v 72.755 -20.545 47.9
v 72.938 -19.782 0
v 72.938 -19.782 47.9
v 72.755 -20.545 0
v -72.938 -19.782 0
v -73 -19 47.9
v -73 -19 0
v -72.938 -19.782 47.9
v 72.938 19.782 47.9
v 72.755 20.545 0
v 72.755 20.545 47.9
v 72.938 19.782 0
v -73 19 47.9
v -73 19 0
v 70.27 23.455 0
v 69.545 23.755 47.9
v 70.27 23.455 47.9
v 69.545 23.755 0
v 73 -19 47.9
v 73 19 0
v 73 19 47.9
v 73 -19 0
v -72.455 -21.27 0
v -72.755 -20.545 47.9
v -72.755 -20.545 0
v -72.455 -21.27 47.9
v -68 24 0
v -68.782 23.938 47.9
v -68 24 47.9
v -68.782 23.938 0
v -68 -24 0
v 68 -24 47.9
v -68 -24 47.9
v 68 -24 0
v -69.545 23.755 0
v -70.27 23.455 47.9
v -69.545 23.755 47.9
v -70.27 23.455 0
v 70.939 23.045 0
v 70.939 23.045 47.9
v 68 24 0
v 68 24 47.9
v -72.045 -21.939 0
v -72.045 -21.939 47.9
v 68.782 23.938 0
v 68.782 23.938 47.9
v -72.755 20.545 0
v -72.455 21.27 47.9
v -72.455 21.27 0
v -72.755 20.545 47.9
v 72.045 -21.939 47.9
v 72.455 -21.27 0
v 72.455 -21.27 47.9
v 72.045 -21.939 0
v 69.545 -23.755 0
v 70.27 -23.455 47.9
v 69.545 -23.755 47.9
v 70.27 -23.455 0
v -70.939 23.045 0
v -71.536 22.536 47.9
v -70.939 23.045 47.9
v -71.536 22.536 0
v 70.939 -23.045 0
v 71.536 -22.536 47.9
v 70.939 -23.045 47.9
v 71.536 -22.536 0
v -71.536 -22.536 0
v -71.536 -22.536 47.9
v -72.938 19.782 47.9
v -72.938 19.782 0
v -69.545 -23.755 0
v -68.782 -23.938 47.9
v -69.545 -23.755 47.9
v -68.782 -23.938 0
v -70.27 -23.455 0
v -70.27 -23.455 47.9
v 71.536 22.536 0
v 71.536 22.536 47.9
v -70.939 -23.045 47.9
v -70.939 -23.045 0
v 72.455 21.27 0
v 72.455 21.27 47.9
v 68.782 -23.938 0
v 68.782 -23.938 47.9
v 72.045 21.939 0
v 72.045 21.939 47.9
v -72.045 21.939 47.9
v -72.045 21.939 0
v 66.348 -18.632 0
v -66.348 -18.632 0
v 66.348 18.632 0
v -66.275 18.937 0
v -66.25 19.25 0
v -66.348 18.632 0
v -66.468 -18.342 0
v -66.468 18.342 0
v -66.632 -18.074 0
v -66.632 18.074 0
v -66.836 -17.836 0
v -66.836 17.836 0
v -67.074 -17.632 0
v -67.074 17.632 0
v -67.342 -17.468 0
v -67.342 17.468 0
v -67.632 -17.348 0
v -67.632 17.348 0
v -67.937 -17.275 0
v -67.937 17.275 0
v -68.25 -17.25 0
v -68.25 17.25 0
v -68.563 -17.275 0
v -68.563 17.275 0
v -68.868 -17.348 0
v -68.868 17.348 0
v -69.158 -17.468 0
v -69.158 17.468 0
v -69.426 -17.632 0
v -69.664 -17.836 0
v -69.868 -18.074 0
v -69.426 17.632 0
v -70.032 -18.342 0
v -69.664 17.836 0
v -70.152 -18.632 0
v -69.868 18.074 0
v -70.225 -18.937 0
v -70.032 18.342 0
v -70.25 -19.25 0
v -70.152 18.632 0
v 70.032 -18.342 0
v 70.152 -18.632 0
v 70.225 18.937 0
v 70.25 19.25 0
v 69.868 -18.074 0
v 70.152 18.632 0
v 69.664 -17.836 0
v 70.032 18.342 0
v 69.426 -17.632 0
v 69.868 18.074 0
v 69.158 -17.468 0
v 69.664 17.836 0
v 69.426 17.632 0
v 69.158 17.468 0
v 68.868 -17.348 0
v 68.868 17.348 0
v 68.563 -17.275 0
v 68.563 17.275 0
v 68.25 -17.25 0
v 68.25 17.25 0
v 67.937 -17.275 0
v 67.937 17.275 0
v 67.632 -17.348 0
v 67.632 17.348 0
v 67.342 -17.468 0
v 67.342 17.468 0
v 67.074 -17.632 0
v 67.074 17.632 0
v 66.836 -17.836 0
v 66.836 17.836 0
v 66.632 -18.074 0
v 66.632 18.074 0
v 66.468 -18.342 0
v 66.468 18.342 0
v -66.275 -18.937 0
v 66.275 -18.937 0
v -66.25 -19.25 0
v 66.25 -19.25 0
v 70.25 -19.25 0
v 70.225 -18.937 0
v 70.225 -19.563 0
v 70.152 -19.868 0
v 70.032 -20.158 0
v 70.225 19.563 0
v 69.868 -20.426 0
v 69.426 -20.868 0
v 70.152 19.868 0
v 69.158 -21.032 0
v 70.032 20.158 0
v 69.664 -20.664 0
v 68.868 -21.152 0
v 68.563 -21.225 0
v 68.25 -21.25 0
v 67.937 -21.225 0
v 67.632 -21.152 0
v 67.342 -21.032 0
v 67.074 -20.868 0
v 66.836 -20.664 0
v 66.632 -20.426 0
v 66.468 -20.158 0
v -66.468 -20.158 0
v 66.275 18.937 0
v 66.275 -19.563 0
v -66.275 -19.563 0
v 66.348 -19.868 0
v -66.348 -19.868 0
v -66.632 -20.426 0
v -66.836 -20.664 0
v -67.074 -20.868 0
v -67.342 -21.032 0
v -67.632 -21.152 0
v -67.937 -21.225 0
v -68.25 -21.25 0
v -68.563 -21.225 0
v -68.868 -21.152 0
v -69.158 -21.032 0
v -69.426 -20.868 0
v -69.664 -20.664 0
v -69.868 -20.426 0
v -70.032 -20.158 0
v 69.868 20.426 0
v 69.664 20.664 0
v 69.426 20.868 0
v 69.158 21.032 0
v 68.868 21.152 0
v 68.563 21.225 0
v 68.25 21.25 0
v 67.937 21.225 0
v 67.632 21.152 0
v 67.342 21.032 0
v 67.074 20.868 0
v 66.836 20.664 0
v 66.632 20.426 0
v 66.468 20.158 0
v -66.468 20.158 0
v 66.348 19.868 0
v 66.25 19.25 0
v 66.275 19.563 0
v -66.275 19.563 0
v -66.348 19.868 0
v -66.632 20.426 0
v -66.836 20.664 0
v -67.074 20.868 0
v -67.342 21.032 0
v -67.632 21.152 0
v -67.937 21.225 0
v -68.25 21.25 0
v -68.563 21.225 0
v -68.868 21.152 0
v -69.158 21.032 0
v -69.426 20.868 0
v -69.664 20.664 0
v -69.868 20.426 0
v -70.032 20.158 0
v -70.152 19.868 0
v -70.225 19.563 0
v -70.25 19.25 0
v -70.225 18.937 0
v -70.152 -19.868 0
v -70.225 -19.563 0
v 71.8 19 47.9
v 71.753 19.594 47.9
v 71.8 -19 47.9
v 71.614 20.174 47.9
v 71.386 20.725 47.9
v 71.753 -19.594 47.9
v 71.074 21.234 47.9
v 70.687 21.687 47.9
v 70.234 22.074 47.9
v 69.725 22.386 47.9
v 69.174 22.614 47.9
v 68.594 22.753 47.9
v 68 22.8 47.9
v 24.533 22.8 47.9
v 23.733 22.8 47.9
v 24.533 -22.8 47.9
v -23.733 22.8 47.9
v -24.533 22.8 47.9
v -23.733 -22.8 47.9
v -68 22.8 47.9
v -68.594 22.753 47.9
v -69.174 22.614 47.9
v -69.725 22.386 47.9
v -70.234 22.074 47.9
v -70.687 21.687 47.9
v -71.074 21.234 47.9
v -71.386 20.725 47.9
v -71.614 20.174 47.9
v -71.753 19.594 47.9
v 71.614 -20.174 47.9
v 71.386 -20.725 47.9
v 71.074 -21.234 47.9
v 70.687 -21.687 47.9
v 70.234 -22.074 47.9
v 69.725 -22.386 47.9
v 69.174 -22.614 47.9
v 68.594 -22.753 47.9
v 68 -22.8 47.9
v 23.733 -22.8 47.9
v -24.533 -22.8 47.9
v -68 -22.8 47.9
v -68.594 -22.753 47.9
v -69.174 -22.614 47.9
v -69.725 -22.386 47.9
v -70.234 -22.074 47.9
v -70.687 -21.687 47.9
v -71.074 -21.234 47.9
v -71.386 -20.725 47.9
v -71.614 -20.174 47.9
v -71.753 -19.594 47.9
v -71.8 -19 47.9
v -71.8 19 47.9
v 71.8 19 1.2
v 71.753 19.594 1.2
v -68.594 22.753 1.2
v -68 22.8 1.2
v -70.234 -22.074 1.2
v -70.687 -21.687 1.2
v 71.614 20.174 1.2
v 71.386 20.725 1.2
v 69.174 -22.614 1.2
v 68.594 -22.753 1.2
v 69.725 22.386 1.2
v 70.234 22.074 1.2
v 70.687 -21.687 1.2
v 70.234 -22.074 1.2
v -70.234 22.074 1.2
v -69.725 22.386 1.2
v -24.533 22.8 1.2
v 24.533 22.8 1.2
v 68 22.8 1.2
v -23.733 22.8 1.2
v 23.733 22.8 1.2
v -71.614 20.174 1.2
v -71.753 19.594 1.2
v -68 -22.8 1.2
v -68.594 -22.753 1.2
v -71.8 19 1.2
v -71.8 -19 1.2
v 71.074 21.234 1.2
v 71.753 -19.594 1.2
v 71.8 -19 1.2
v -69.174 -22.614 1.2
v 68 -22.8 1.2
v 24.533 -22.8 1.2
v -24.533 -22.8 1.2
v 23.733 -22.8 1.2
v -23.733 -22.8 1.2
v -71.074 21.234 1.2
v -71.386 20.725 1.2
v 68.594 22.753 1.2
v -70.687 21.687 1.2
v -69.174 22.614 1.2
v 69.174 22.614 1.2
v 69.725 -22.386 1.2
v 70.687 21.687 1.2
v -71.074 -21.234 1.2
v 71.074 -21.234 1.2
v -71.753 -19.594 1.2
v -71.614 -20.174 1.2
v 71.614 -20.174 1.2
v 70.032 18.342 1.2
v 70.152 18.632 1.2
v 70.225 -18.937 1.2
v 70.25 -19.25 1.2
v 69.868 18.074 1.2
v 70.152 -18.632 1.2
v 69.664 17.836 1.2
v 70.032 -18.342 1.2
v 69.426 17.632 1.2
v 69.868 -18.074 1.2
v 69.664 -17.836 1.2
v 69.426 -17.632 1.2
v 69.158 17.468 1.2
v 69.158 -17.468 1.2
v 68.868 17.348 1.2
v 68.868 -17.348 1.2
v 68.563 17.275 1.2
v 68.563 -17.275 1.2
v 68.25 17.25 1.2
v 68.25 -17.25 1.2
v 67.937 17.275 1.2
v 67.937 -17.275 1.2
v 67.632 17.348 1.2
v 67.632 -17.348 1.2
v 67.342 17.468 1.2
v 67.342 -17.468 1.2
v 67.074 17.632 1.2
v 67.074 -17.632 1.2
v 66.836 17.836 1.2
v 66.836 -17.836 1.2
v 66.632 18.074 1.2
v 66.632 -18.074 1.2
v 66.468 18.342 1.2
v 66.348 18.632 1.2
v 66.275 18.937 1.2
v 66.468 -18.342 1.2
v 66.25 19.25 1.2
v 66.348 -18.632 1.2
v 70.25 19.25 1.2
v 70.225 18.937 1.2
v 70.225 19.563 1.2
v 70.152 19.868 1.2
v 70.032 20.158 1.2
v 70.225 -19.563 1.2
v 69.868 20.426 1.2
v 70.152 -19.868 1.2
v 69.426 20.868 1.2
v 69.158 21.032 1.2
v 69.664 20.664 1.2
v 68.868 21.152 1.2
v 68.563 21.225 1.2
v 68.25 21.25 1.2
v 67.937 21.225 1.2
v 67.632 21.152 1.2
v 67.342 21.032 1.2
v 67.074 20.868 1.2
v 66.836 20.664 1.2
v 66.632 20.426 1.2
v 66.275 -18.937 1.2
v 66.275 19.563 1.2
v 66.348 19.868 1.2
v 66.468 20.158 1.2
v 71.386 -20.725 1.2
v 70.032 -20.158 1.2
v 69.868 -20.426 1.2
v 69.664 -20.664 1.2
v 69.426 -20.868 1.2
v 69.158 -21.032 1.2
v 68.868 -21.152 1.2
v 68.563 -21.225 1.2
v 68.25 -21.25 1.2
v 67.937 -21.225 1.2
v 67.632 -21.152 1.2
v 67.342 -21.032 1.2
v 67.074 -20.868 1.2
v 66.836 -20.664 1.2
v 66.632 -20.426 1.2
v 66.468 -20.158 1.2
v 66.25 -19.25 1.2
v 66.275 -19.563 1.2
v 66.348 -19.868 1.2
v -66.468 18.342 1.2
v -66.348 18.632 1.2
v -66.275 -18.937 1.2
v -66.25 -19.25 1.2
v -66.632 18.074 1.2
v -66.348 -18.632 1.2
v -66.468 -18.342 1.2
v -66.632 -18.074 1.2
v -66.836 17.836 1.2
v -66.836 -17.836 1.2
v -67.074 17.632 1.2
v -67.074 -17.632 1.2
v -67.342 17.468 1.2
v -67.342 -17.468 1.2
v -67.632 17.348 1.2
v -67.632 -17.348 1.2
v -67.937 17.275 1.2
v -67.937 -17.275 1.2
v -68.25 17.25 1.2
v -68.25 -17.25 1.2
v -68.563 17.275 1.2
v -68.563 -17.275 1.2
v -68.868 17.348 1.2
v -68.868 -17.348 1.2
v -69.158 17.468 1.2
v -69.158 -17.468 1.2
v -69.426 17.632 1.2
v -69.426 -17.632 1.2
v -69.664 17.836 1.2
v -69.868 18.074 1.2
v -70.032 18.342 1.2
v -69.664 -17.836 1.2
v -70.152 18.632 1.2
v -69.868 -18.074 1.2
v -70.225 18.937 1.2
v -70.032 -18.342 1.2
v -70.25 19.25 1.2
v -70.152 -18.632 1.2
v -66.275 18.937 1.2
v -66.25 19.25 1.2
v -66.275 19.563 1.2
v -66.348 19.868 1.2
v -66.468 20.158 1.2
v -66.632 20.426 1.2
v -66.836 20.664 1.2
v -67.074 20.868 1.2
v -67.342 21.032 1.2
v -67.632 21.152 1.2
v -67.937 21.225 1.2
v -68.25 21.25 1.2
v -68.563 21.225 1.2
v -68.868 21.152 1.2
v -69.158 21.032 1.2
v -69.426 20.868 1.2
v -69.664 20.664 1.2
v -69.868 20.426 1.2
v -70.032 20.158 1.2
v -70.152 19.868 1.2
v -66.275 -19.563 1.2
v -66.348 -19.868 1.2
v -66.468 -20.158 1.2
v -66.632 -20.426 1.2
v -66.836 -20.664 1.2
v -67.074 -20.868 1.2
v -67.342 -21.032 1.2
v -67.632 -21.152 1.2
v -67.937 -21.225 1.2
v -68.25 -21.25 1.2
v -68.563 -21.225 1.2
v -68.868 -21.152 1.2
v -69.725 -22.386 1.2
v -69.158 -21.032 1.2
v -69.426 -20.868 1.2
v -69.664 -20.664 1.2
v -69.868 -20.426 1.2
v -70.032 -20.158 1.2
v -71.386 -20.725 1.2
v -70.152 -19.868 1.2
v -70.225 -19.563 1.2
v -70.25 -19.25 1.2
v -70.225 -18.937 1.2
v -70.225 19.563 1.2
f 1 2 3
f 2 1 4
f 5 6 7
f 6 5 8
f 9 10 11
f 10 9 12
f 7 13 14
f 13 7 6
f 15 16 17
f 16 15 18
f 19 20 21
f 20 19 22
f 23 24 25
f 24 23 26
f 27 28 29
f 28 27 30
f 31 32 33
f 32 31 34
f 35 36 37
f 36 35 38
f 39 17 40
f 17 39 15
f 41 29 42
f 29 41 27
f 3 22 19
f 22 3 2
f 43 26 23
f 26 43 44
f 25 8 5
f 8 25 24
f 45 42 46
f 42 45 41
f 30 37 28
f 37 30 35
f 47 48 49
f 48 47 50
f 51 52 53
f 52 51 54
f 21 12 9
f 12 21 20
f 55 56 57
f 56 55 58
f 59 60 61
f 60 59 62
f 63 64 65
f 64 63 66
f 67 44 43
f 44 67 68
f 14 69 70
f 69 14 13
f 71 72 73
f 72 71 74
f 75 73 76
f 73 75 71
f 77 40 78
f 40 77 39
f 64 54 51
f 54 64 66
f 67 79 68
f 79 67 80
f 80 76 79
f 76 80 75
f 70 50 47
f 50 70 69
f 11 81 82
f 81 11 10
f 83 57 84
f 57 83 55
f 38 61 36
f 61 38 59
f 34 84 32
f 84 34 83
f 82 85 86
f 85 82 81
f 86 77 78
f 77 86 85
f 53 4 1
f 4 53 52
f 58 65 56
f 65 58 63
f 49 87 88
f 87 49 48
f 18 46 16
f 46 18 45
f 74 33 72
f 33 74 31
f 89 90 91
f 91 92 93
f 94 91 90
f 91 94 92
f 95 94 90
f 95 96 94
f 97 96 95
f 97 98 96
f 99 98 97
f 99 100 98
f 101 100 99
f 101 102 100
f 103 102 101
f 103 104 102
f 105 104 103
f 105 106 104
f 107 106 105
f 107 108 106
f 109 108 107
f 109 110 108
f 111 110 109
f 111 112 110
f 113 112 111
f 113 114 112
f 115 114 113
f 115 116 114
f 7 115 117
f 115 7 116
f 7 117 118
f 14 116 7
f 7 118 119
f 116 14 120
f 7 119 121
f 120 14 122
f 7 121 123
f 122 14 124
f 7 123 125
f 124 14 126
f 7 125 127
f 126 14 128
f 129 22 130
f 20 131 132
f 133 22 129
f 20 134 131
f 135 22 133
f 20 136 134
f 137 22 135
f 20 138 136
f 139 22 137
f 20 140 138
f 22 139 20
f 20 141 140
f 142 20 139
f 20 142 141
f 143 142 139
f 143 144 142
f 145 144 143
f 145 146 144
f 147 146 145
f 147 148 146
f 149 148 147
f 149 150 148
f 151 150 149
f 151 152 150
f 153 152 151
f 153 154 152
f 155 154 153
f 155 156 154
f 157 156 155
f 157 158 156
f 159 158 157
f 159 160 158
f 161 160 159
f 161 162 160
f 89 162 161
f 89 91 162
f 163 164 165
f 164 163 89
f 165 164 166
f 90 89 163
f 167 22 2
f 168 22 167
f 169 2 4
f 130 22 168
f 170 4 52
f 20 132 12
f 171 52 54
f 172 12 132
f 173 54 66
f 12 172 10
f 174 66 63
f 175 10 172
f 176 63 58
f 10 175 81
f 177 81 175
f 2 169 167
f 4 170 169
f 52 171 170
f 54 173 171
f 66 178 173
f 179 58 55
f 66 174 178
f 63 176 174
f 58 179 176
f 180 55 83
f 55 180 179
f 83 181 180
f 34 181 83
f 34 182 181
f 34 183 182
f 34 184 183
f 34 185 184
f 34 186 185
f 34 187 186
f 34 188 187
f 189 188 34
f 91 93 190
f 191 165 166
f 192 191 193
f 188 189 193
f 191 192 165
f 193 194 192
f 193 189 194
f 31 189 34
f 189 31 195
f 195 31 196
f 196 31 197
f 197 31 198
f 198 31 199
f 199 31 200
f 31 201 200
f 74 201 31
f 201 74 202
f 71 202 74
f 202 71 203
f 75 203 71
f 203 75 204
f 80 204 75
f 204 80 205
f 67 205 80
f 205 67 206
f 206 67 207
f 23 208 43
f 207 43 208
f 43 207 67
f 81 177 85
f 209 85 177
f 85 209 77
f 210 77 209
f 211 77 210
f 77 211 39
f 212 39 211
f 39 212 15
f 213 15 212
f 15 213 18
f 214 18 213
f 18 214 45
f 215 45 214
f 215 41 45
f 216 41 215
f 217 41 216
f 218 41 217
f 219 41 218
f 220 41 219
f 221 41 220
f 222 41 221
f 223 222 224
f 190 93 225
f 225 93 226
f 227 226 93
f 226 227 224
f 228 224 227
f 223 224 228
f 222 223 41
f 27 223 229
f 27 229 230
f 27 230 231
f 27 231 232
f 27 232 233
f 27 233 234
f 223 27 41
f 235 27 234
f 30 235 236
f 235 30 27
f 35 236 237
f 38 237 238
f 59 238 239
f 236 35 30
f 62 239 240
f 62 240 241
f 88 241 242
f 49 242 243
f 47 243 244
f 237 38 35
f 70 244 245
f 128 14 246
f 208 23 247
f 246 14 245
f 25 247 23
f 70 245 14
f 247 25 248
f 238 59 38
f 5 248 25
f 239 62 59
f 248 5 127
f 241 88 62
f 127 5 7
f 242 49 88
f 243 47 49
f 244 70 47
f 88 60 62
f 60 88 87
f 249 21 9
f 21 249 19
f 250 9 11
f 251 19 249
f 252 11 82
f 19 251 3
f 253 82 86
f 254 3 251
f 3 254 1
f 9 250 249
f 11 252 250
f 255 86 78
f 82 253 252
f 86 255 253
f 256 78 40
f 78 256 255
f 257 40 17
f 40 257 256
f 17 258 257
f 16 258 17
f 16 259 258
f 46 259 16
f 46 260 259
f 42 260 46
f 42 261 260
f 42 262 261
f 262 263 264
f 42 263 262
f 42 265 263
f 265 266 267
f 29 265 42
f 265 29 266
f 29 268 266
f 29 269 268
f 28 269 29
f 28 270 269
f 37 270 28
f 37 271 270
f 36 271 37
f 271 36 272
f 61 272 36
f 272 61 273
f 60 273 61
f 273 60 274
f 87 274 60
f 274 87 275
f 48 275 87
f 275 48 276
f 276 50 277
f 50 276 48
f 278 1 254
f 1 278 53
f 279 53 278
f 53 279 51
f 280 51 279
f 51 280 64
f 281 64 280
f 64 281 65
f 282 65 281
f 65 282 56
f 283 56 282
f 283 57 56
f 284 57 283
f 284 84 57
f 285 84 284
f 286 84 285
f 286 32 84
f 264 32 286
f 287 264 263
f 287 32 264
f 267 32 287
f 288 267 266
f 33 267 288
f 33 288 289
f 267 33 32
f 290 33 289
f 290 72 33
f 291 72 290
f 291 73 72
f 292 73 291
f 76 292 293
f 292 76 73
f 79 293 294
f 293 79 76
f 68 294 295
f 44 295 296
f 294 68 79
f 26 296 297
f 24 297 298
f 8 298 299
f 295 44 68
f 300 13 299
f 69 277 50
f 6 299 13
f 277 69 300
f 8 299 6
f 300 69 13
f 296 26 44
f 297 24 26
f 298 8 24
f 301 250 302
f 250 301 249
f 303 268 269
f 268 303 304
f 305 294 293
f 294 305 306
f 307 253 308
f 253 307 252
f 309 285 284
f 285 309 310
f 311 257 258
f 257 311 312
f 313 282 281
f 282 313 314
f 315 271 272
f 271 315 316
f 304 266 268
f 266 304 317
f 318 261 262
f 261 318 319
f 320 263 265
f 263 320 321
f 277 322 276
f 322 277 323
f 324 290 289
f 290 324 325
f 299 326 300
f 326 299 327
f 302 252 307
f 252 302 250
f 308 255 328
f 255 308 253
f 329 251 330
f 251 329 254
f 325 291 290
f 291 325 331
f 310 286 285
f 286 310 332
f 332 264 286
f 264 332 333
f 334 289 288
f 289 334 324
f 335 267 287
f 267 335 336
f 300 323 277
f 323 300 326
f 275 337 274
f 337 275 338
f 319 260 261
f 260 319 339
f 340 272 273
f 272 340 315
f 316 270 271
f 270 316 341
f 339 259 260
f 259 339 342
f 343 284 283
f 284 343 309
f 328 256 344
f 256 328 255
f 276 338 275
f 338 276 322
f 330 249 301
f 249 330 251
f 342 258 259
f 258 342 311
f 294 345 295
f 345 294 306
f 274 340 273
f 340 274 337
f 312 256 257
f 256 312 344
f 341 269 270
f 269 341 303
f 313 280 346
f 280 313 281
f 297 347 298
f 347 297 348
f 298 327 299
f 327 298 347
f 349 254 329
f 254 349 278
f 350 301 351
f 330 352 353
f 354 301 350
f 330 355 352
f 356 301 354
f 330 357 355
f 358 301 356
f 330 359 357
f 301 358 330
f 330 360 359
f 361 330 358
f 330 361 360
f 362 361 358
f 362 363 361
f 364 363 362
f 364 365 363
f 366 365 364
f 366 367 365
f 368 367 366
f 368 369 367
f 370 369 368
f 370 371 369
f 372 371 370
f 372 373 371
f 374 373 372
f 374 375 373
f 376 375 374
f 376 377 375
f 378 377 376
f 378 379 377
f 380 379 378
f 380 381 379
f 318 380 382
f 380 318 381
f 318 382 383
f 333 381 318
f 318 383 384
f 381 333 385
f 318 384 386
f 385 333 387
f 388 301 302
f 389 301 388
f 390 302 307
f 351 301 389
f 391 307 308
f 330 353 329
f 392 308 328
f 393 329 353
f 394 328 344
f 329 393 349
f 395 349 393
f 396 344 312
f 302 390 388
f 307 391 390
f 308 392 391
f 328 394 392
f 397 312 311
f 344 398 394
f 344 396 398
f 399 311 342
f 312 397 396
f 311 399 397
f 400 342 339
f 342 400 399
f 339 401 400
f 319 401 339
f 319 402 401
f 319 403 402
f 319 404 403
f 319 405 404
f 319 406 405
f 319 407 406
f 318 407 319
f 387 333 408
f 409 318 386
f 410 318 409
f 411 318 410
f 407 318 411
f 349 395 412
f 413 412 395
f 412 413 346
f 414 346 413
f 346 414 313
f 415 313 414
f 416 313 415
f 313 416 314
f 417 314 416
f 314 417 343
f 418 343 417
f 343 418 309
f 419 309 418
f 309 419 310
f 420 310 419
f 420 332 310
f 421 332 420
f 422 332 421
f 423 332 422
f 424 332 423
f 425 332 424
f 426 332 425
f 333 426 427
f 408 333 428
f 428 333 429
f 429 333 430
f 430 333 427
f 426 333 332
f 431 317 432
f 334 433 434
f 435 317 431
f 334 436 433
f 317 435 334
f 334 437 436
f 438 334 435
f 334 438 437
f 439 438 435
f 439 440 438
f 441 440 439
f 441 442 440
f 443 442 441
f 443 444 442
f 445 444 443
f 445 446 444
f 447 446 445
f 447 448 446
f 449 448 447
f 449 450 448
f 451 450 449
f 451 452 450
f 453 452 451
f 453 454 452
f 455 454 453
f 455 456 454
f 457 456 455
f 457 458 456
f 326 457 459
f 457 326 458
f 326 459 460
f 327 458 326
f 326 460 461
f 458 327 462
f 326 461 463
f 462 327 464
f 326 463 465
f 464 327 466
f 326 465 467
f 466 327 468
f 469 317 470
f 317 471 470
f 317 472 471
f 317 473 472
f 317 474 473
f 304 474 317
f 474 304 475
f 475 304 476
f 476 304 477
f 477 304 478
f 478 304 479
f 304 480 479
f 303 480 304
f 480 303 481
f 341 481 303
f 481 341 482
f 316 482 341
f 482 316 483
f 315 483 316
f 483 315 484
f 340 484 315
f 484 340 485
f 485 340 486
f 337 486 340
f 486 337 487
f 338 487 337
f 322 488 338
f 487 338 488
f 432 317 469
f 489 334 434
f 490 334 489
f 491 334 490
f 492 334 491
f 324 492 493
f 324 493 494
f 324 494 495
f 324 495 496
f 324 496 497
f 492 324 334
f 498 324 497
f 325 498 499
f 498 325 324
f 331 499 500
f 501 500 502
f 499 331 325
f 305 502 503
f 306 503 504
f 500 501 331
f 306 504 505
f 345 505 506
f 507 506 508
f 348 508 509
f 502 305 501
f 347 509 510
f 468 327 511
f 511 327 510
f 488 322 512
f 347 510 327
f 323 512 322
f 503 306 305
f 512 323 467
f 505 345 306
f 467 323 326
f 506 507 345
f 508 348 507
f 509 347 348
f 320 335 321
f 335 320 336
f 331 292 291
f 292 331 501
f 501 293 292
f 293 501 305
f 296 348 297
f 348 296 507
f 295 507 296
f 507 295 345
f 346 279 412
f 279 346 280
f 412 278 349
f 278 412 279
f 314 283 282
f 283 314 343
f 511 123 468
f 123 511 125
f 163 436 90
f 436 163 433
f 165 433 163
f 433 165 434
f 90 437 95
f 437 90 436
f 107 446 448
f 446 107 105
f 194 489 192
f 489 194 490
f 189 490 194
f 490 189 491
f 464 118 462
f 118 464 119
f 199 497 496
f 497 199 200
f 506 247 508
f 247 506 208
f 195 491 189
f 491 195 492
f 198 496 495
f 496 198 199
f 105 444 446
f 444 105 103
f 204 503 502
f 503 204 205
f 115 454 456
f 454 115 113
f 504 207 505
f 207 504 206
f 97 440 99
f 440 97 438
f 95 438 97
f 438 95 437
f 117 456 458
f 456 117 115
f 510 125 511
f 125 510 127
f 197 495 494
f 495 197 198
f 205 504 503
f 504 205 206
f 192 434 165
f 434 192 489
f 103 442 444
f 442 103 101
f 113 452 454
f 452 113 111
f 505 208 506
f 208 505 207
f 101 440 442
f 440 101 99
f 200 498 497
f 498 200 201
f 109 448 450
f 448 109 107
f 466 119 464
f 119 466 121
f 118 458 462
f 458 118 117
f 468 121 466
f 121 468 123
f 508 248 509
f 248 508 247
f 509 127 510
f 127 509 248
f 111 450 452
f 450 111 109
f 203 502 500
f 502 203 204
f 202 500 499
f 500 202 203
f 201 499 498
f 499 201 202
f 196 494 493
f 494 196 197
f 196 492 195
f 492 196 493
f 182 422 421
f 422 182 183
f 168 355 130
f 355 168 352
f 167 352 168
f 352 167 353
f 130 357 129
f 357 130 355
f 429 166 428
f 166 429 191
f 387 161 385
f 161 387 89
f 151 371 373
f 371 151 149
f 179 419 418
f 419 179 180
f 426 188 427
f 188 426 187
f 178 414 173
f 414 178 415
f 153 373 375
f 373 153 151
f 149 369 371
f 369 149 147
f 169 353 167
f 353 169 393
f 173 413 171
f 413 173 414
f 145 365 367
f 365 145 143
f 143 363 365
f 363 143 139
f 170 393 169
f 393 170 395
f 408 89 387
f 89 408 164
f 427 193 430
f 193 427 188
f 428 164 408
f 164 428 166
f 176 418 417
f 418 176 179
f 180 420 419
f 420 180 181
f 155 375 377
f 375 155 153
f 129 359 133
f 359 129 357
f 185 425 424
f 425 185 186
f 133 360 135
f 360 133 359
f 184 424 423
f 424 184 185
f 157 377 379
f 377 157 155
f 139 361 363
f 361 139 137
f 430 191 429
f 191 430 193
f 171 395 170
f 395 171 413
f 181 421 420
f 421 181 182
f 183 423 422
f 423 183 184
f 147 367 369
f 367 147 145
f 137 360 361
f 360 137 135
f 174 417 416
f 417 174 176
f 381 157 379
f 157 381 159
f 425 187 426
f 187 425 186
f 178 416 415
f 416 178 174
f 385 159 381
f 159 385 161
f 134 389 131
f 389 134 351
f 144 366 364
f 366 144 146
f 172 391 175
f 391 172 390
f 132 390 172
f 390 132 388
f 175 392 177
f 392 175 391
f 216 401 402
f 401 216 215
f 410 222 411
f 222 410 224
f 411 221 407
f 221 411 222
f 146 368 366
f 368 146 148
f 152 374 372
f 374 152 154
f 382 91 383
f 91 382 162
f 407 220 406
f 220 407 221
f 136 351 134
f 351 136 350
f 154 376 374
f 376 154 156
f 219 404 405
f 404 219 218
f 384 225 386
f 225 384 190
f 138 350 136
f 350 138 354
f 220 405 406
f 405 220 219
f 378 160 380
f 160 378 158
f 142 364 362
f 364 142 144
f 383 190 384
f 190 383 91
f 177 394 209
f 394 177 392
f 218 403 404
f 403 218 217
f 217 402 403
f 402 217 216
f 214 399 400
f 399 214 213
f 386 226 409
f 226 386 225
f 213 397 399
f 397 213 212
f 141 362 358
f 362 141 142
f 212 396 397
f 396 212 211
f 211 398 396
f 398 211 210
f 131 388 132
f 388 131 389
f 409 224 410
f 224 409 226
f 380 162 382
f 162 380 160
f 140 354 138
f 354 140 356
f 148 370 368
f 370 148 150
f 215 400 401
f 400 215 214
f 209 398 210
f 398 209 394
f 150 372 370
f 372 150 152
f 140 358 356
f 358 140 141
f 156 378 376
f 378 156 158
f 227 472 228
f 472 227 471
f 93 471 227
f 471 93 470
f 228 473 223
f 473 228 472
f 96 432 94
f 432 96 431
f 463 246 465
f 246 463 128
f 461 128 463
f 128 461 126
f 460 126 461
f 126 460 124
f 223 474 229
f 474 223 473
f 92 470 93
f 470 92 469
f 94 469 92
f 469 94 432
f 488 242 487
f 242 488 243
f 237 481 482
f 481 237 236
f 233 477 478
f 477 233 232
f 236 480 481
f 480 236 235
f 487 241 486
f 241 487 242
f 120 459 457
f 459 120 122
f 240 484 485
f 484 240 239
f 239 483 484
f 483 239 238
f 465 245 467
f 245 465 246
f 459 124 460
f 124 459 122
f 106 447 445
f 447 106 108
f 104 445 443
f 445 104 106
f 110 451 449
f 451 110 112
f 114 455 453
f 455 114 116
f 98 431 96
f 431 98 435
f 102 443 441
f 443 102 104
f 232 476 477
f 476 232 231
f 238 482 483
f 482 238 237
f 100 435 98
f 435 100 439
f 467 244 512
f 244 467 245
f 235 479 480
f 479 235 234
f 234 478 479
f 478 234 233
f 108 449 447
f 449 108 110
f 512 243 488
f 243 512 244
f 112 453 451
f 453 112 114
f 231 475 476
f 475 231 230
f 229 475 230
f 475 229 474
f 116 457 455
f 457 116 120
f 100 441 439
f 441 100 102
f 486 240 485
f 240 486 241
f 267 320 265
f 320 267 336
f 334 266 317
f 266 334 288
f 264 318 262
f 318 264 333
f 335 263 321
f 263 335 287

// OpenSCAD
// created by skytale
// http://www.thingiverse.com/skytale/designs


// Options!
/* [SimplBox Insert] */
//Box measures
type = 6; // [0:Custom,1:Sortimo Small,2:Sortimo Medium,3:Sortimo Large, 4:Allit Euro Plus Small, 5:Allit Euro Plus Large, 6:Alutec]
// How many units in x-direction?
xCount = 3; // [1:6]
// How many units in y-direction?
yCount = 1; // [1:6]
// How many separators in x-direction?
xSeparators = 2;
// How many separators in y-direction?
ySeparators = 0;
// Feet holes?
feetHoles = true; // [true:yes, false:no]

/* [Misc Parameters] */
// Wall Thickness.
wallThickness = 1.2;
innerWallThickness = 0.8;

customWidth = 50;
customDepth = 50;
customHeight = 20;
feetHeight = 2.4;

/* [Hidden] */
cornerRadius = 5;
holeDistance = 6.5;
holeDiameter = 4;
fn = 40;

// DIMENSIONS

// Custom
if (type == 0) doBox(customWidth * xCount, customDepth * yCount, customHeight - feetHeight, holeDistance);

// Sortimo S
if (type == 1) doBox(52 * xCount, 52 * yCount, 31 - feetHeight, holeDistance);

// Sortimo M
if (type == 2) doBox(52 * xCount, 52 * yCount, 44 - feetHeight, holdeDistance);

// Sortimo L
if (type == 3) doBox(52 * xCount, 52 * yCount, 63 - feetHeight, holeDistance);

// Allit S
if (type == 4) doBox(54 * xCount, 54 * yCount, 45 - feetHeight, holeDistance);

// Allit L
if (type == 5) doBox(54 * xCount, 54 * yCount, 63 - feetHeight, holeDistance);

// Alutec (feet distance = 38.5)
if (type == 6) doBox(48 * xCount + (xCount - 1), 48 * yCount + (yCount - 1), 50.3 - feetHeight, (48-33.5-5)/2);  // 1mm*(xyCount -1):-> 1mm space compensation for multilength boxes


module doBox(width, depth, height, holeDistance) {
	difference() {
		box(width, depth, height);
		if (feetHoles) holes(width, depth, holeDistance);
	}
	makeSeparators(width, depth, height);
}

module box(width, depth, height) {
	cWidth = width - 2 * cornerRadius;
	cDepth = depth - 2* cornerRadius;
	difference() {
		hull() {
			translate([-cWidth / 2, -cDepth / 2, 0]) cylinder(height, cornerRadius, cornerRadius, $fn = fn);
			translate([+cWidth / 2, -cDepth / 2, 0]) cylinder(height, cornerRadius, cornerRadius, $fn = fn);
			translate([+cWidth / 2, +cDepth / 2, 0]) cylinder(height, cornerRadius, cornerRadius, $fn = fn);
			translate([-cWidth / 2, +cDepth / 2, 0]) cylinder(height, cornerRadius, cornerRadius, $fn = fn);
		}
		hull() {
			translate([-cWidth / 2, -cDepth / 2, wallThickness]) cylinder(height, cornerRadius - wallThickness, cornerRadius - wallThickness, $fn = fn);
			translate([+cWidth / 2, -cDepth / 2, wallThickness]) cylinder(height, cornerRadius - wallThickness, cornerRadius - wallThickness, $fn = fn);
			translate([+cWidth / 2, +cDepth / 2, wallThickness]) cylinder(height, cornerRadius - wallThickness, cornerRadius - wallThickness, $fn = fn);
			translate([-cWidth / 2, +cDepth / 2 , wallThickness]) cylinder(height, cornerRadius - wallThickness, cornerRadius - wallThickness, $fn = fn);
		}
	}
}

module holes(width, depth, holeDistance) {
	translate([-width / 2 + holeDistance, -depth / 2 + holeDistance, -1]) cylinder(wallThickness + 2, holeDiameter / 2, holeDiameter / 2, $fn = fn);
	translate([+width / 2 - holeDistance, -depth / 2 + holeDistance, -1]) cylinder(wallThickness + 2, holeDiameter / 2, holeDiameter / 2, $fn = fn);
	translate([+width / 2 - holeDistance, +depth / 2 - holeDistance, -1]) cylinder(wallThickness + 2, holeDiameter / 2, holeDiameter / 2, $fn = fn);
	translate([-width / 2 + holeDistance, +depth / 2 - holeDistance, -1]) cylinder(wallThickness + 2, holeDiameter / 2, holeDiameter / 2, $fn = fn);
}


// separators

module makeSeparators(width, depth, height){
 if(xSeparators >= 1){
  for (i = [1 : xSeparators]){
	xSeparator(width, depth, height, ((width - wallThickness) / (xSeparators + 1)) * i);
	//xSeparator(0);
	//xSeparator(width - wallThickness);
  }
 }
 if(ySeparators >= 1){
  for (i = [1 : ySeparators]){
  	ySeparator(width, depth, height, ((depth - wallThickness) / (ySeparators + 1)) * i);
	//ySeparator(0);
	//ySeparator(depth - wallThickness);
  }
 }
}

module xSeparator(width, depth, height, pos){
	translate([(-width + wallThickness) / 2 + pos, 0 ,height / 2]) cube(size = [innerWallThickness, depth - wallThickness, height], center = true);
}

module ySeparator(width, depth, height, pos){
	translate([0, (-depth + wallThickness) / 2 + pos ,height / 2]) cube(size = [width - wallThickness, innerWallThickness, height], center = true);
}
